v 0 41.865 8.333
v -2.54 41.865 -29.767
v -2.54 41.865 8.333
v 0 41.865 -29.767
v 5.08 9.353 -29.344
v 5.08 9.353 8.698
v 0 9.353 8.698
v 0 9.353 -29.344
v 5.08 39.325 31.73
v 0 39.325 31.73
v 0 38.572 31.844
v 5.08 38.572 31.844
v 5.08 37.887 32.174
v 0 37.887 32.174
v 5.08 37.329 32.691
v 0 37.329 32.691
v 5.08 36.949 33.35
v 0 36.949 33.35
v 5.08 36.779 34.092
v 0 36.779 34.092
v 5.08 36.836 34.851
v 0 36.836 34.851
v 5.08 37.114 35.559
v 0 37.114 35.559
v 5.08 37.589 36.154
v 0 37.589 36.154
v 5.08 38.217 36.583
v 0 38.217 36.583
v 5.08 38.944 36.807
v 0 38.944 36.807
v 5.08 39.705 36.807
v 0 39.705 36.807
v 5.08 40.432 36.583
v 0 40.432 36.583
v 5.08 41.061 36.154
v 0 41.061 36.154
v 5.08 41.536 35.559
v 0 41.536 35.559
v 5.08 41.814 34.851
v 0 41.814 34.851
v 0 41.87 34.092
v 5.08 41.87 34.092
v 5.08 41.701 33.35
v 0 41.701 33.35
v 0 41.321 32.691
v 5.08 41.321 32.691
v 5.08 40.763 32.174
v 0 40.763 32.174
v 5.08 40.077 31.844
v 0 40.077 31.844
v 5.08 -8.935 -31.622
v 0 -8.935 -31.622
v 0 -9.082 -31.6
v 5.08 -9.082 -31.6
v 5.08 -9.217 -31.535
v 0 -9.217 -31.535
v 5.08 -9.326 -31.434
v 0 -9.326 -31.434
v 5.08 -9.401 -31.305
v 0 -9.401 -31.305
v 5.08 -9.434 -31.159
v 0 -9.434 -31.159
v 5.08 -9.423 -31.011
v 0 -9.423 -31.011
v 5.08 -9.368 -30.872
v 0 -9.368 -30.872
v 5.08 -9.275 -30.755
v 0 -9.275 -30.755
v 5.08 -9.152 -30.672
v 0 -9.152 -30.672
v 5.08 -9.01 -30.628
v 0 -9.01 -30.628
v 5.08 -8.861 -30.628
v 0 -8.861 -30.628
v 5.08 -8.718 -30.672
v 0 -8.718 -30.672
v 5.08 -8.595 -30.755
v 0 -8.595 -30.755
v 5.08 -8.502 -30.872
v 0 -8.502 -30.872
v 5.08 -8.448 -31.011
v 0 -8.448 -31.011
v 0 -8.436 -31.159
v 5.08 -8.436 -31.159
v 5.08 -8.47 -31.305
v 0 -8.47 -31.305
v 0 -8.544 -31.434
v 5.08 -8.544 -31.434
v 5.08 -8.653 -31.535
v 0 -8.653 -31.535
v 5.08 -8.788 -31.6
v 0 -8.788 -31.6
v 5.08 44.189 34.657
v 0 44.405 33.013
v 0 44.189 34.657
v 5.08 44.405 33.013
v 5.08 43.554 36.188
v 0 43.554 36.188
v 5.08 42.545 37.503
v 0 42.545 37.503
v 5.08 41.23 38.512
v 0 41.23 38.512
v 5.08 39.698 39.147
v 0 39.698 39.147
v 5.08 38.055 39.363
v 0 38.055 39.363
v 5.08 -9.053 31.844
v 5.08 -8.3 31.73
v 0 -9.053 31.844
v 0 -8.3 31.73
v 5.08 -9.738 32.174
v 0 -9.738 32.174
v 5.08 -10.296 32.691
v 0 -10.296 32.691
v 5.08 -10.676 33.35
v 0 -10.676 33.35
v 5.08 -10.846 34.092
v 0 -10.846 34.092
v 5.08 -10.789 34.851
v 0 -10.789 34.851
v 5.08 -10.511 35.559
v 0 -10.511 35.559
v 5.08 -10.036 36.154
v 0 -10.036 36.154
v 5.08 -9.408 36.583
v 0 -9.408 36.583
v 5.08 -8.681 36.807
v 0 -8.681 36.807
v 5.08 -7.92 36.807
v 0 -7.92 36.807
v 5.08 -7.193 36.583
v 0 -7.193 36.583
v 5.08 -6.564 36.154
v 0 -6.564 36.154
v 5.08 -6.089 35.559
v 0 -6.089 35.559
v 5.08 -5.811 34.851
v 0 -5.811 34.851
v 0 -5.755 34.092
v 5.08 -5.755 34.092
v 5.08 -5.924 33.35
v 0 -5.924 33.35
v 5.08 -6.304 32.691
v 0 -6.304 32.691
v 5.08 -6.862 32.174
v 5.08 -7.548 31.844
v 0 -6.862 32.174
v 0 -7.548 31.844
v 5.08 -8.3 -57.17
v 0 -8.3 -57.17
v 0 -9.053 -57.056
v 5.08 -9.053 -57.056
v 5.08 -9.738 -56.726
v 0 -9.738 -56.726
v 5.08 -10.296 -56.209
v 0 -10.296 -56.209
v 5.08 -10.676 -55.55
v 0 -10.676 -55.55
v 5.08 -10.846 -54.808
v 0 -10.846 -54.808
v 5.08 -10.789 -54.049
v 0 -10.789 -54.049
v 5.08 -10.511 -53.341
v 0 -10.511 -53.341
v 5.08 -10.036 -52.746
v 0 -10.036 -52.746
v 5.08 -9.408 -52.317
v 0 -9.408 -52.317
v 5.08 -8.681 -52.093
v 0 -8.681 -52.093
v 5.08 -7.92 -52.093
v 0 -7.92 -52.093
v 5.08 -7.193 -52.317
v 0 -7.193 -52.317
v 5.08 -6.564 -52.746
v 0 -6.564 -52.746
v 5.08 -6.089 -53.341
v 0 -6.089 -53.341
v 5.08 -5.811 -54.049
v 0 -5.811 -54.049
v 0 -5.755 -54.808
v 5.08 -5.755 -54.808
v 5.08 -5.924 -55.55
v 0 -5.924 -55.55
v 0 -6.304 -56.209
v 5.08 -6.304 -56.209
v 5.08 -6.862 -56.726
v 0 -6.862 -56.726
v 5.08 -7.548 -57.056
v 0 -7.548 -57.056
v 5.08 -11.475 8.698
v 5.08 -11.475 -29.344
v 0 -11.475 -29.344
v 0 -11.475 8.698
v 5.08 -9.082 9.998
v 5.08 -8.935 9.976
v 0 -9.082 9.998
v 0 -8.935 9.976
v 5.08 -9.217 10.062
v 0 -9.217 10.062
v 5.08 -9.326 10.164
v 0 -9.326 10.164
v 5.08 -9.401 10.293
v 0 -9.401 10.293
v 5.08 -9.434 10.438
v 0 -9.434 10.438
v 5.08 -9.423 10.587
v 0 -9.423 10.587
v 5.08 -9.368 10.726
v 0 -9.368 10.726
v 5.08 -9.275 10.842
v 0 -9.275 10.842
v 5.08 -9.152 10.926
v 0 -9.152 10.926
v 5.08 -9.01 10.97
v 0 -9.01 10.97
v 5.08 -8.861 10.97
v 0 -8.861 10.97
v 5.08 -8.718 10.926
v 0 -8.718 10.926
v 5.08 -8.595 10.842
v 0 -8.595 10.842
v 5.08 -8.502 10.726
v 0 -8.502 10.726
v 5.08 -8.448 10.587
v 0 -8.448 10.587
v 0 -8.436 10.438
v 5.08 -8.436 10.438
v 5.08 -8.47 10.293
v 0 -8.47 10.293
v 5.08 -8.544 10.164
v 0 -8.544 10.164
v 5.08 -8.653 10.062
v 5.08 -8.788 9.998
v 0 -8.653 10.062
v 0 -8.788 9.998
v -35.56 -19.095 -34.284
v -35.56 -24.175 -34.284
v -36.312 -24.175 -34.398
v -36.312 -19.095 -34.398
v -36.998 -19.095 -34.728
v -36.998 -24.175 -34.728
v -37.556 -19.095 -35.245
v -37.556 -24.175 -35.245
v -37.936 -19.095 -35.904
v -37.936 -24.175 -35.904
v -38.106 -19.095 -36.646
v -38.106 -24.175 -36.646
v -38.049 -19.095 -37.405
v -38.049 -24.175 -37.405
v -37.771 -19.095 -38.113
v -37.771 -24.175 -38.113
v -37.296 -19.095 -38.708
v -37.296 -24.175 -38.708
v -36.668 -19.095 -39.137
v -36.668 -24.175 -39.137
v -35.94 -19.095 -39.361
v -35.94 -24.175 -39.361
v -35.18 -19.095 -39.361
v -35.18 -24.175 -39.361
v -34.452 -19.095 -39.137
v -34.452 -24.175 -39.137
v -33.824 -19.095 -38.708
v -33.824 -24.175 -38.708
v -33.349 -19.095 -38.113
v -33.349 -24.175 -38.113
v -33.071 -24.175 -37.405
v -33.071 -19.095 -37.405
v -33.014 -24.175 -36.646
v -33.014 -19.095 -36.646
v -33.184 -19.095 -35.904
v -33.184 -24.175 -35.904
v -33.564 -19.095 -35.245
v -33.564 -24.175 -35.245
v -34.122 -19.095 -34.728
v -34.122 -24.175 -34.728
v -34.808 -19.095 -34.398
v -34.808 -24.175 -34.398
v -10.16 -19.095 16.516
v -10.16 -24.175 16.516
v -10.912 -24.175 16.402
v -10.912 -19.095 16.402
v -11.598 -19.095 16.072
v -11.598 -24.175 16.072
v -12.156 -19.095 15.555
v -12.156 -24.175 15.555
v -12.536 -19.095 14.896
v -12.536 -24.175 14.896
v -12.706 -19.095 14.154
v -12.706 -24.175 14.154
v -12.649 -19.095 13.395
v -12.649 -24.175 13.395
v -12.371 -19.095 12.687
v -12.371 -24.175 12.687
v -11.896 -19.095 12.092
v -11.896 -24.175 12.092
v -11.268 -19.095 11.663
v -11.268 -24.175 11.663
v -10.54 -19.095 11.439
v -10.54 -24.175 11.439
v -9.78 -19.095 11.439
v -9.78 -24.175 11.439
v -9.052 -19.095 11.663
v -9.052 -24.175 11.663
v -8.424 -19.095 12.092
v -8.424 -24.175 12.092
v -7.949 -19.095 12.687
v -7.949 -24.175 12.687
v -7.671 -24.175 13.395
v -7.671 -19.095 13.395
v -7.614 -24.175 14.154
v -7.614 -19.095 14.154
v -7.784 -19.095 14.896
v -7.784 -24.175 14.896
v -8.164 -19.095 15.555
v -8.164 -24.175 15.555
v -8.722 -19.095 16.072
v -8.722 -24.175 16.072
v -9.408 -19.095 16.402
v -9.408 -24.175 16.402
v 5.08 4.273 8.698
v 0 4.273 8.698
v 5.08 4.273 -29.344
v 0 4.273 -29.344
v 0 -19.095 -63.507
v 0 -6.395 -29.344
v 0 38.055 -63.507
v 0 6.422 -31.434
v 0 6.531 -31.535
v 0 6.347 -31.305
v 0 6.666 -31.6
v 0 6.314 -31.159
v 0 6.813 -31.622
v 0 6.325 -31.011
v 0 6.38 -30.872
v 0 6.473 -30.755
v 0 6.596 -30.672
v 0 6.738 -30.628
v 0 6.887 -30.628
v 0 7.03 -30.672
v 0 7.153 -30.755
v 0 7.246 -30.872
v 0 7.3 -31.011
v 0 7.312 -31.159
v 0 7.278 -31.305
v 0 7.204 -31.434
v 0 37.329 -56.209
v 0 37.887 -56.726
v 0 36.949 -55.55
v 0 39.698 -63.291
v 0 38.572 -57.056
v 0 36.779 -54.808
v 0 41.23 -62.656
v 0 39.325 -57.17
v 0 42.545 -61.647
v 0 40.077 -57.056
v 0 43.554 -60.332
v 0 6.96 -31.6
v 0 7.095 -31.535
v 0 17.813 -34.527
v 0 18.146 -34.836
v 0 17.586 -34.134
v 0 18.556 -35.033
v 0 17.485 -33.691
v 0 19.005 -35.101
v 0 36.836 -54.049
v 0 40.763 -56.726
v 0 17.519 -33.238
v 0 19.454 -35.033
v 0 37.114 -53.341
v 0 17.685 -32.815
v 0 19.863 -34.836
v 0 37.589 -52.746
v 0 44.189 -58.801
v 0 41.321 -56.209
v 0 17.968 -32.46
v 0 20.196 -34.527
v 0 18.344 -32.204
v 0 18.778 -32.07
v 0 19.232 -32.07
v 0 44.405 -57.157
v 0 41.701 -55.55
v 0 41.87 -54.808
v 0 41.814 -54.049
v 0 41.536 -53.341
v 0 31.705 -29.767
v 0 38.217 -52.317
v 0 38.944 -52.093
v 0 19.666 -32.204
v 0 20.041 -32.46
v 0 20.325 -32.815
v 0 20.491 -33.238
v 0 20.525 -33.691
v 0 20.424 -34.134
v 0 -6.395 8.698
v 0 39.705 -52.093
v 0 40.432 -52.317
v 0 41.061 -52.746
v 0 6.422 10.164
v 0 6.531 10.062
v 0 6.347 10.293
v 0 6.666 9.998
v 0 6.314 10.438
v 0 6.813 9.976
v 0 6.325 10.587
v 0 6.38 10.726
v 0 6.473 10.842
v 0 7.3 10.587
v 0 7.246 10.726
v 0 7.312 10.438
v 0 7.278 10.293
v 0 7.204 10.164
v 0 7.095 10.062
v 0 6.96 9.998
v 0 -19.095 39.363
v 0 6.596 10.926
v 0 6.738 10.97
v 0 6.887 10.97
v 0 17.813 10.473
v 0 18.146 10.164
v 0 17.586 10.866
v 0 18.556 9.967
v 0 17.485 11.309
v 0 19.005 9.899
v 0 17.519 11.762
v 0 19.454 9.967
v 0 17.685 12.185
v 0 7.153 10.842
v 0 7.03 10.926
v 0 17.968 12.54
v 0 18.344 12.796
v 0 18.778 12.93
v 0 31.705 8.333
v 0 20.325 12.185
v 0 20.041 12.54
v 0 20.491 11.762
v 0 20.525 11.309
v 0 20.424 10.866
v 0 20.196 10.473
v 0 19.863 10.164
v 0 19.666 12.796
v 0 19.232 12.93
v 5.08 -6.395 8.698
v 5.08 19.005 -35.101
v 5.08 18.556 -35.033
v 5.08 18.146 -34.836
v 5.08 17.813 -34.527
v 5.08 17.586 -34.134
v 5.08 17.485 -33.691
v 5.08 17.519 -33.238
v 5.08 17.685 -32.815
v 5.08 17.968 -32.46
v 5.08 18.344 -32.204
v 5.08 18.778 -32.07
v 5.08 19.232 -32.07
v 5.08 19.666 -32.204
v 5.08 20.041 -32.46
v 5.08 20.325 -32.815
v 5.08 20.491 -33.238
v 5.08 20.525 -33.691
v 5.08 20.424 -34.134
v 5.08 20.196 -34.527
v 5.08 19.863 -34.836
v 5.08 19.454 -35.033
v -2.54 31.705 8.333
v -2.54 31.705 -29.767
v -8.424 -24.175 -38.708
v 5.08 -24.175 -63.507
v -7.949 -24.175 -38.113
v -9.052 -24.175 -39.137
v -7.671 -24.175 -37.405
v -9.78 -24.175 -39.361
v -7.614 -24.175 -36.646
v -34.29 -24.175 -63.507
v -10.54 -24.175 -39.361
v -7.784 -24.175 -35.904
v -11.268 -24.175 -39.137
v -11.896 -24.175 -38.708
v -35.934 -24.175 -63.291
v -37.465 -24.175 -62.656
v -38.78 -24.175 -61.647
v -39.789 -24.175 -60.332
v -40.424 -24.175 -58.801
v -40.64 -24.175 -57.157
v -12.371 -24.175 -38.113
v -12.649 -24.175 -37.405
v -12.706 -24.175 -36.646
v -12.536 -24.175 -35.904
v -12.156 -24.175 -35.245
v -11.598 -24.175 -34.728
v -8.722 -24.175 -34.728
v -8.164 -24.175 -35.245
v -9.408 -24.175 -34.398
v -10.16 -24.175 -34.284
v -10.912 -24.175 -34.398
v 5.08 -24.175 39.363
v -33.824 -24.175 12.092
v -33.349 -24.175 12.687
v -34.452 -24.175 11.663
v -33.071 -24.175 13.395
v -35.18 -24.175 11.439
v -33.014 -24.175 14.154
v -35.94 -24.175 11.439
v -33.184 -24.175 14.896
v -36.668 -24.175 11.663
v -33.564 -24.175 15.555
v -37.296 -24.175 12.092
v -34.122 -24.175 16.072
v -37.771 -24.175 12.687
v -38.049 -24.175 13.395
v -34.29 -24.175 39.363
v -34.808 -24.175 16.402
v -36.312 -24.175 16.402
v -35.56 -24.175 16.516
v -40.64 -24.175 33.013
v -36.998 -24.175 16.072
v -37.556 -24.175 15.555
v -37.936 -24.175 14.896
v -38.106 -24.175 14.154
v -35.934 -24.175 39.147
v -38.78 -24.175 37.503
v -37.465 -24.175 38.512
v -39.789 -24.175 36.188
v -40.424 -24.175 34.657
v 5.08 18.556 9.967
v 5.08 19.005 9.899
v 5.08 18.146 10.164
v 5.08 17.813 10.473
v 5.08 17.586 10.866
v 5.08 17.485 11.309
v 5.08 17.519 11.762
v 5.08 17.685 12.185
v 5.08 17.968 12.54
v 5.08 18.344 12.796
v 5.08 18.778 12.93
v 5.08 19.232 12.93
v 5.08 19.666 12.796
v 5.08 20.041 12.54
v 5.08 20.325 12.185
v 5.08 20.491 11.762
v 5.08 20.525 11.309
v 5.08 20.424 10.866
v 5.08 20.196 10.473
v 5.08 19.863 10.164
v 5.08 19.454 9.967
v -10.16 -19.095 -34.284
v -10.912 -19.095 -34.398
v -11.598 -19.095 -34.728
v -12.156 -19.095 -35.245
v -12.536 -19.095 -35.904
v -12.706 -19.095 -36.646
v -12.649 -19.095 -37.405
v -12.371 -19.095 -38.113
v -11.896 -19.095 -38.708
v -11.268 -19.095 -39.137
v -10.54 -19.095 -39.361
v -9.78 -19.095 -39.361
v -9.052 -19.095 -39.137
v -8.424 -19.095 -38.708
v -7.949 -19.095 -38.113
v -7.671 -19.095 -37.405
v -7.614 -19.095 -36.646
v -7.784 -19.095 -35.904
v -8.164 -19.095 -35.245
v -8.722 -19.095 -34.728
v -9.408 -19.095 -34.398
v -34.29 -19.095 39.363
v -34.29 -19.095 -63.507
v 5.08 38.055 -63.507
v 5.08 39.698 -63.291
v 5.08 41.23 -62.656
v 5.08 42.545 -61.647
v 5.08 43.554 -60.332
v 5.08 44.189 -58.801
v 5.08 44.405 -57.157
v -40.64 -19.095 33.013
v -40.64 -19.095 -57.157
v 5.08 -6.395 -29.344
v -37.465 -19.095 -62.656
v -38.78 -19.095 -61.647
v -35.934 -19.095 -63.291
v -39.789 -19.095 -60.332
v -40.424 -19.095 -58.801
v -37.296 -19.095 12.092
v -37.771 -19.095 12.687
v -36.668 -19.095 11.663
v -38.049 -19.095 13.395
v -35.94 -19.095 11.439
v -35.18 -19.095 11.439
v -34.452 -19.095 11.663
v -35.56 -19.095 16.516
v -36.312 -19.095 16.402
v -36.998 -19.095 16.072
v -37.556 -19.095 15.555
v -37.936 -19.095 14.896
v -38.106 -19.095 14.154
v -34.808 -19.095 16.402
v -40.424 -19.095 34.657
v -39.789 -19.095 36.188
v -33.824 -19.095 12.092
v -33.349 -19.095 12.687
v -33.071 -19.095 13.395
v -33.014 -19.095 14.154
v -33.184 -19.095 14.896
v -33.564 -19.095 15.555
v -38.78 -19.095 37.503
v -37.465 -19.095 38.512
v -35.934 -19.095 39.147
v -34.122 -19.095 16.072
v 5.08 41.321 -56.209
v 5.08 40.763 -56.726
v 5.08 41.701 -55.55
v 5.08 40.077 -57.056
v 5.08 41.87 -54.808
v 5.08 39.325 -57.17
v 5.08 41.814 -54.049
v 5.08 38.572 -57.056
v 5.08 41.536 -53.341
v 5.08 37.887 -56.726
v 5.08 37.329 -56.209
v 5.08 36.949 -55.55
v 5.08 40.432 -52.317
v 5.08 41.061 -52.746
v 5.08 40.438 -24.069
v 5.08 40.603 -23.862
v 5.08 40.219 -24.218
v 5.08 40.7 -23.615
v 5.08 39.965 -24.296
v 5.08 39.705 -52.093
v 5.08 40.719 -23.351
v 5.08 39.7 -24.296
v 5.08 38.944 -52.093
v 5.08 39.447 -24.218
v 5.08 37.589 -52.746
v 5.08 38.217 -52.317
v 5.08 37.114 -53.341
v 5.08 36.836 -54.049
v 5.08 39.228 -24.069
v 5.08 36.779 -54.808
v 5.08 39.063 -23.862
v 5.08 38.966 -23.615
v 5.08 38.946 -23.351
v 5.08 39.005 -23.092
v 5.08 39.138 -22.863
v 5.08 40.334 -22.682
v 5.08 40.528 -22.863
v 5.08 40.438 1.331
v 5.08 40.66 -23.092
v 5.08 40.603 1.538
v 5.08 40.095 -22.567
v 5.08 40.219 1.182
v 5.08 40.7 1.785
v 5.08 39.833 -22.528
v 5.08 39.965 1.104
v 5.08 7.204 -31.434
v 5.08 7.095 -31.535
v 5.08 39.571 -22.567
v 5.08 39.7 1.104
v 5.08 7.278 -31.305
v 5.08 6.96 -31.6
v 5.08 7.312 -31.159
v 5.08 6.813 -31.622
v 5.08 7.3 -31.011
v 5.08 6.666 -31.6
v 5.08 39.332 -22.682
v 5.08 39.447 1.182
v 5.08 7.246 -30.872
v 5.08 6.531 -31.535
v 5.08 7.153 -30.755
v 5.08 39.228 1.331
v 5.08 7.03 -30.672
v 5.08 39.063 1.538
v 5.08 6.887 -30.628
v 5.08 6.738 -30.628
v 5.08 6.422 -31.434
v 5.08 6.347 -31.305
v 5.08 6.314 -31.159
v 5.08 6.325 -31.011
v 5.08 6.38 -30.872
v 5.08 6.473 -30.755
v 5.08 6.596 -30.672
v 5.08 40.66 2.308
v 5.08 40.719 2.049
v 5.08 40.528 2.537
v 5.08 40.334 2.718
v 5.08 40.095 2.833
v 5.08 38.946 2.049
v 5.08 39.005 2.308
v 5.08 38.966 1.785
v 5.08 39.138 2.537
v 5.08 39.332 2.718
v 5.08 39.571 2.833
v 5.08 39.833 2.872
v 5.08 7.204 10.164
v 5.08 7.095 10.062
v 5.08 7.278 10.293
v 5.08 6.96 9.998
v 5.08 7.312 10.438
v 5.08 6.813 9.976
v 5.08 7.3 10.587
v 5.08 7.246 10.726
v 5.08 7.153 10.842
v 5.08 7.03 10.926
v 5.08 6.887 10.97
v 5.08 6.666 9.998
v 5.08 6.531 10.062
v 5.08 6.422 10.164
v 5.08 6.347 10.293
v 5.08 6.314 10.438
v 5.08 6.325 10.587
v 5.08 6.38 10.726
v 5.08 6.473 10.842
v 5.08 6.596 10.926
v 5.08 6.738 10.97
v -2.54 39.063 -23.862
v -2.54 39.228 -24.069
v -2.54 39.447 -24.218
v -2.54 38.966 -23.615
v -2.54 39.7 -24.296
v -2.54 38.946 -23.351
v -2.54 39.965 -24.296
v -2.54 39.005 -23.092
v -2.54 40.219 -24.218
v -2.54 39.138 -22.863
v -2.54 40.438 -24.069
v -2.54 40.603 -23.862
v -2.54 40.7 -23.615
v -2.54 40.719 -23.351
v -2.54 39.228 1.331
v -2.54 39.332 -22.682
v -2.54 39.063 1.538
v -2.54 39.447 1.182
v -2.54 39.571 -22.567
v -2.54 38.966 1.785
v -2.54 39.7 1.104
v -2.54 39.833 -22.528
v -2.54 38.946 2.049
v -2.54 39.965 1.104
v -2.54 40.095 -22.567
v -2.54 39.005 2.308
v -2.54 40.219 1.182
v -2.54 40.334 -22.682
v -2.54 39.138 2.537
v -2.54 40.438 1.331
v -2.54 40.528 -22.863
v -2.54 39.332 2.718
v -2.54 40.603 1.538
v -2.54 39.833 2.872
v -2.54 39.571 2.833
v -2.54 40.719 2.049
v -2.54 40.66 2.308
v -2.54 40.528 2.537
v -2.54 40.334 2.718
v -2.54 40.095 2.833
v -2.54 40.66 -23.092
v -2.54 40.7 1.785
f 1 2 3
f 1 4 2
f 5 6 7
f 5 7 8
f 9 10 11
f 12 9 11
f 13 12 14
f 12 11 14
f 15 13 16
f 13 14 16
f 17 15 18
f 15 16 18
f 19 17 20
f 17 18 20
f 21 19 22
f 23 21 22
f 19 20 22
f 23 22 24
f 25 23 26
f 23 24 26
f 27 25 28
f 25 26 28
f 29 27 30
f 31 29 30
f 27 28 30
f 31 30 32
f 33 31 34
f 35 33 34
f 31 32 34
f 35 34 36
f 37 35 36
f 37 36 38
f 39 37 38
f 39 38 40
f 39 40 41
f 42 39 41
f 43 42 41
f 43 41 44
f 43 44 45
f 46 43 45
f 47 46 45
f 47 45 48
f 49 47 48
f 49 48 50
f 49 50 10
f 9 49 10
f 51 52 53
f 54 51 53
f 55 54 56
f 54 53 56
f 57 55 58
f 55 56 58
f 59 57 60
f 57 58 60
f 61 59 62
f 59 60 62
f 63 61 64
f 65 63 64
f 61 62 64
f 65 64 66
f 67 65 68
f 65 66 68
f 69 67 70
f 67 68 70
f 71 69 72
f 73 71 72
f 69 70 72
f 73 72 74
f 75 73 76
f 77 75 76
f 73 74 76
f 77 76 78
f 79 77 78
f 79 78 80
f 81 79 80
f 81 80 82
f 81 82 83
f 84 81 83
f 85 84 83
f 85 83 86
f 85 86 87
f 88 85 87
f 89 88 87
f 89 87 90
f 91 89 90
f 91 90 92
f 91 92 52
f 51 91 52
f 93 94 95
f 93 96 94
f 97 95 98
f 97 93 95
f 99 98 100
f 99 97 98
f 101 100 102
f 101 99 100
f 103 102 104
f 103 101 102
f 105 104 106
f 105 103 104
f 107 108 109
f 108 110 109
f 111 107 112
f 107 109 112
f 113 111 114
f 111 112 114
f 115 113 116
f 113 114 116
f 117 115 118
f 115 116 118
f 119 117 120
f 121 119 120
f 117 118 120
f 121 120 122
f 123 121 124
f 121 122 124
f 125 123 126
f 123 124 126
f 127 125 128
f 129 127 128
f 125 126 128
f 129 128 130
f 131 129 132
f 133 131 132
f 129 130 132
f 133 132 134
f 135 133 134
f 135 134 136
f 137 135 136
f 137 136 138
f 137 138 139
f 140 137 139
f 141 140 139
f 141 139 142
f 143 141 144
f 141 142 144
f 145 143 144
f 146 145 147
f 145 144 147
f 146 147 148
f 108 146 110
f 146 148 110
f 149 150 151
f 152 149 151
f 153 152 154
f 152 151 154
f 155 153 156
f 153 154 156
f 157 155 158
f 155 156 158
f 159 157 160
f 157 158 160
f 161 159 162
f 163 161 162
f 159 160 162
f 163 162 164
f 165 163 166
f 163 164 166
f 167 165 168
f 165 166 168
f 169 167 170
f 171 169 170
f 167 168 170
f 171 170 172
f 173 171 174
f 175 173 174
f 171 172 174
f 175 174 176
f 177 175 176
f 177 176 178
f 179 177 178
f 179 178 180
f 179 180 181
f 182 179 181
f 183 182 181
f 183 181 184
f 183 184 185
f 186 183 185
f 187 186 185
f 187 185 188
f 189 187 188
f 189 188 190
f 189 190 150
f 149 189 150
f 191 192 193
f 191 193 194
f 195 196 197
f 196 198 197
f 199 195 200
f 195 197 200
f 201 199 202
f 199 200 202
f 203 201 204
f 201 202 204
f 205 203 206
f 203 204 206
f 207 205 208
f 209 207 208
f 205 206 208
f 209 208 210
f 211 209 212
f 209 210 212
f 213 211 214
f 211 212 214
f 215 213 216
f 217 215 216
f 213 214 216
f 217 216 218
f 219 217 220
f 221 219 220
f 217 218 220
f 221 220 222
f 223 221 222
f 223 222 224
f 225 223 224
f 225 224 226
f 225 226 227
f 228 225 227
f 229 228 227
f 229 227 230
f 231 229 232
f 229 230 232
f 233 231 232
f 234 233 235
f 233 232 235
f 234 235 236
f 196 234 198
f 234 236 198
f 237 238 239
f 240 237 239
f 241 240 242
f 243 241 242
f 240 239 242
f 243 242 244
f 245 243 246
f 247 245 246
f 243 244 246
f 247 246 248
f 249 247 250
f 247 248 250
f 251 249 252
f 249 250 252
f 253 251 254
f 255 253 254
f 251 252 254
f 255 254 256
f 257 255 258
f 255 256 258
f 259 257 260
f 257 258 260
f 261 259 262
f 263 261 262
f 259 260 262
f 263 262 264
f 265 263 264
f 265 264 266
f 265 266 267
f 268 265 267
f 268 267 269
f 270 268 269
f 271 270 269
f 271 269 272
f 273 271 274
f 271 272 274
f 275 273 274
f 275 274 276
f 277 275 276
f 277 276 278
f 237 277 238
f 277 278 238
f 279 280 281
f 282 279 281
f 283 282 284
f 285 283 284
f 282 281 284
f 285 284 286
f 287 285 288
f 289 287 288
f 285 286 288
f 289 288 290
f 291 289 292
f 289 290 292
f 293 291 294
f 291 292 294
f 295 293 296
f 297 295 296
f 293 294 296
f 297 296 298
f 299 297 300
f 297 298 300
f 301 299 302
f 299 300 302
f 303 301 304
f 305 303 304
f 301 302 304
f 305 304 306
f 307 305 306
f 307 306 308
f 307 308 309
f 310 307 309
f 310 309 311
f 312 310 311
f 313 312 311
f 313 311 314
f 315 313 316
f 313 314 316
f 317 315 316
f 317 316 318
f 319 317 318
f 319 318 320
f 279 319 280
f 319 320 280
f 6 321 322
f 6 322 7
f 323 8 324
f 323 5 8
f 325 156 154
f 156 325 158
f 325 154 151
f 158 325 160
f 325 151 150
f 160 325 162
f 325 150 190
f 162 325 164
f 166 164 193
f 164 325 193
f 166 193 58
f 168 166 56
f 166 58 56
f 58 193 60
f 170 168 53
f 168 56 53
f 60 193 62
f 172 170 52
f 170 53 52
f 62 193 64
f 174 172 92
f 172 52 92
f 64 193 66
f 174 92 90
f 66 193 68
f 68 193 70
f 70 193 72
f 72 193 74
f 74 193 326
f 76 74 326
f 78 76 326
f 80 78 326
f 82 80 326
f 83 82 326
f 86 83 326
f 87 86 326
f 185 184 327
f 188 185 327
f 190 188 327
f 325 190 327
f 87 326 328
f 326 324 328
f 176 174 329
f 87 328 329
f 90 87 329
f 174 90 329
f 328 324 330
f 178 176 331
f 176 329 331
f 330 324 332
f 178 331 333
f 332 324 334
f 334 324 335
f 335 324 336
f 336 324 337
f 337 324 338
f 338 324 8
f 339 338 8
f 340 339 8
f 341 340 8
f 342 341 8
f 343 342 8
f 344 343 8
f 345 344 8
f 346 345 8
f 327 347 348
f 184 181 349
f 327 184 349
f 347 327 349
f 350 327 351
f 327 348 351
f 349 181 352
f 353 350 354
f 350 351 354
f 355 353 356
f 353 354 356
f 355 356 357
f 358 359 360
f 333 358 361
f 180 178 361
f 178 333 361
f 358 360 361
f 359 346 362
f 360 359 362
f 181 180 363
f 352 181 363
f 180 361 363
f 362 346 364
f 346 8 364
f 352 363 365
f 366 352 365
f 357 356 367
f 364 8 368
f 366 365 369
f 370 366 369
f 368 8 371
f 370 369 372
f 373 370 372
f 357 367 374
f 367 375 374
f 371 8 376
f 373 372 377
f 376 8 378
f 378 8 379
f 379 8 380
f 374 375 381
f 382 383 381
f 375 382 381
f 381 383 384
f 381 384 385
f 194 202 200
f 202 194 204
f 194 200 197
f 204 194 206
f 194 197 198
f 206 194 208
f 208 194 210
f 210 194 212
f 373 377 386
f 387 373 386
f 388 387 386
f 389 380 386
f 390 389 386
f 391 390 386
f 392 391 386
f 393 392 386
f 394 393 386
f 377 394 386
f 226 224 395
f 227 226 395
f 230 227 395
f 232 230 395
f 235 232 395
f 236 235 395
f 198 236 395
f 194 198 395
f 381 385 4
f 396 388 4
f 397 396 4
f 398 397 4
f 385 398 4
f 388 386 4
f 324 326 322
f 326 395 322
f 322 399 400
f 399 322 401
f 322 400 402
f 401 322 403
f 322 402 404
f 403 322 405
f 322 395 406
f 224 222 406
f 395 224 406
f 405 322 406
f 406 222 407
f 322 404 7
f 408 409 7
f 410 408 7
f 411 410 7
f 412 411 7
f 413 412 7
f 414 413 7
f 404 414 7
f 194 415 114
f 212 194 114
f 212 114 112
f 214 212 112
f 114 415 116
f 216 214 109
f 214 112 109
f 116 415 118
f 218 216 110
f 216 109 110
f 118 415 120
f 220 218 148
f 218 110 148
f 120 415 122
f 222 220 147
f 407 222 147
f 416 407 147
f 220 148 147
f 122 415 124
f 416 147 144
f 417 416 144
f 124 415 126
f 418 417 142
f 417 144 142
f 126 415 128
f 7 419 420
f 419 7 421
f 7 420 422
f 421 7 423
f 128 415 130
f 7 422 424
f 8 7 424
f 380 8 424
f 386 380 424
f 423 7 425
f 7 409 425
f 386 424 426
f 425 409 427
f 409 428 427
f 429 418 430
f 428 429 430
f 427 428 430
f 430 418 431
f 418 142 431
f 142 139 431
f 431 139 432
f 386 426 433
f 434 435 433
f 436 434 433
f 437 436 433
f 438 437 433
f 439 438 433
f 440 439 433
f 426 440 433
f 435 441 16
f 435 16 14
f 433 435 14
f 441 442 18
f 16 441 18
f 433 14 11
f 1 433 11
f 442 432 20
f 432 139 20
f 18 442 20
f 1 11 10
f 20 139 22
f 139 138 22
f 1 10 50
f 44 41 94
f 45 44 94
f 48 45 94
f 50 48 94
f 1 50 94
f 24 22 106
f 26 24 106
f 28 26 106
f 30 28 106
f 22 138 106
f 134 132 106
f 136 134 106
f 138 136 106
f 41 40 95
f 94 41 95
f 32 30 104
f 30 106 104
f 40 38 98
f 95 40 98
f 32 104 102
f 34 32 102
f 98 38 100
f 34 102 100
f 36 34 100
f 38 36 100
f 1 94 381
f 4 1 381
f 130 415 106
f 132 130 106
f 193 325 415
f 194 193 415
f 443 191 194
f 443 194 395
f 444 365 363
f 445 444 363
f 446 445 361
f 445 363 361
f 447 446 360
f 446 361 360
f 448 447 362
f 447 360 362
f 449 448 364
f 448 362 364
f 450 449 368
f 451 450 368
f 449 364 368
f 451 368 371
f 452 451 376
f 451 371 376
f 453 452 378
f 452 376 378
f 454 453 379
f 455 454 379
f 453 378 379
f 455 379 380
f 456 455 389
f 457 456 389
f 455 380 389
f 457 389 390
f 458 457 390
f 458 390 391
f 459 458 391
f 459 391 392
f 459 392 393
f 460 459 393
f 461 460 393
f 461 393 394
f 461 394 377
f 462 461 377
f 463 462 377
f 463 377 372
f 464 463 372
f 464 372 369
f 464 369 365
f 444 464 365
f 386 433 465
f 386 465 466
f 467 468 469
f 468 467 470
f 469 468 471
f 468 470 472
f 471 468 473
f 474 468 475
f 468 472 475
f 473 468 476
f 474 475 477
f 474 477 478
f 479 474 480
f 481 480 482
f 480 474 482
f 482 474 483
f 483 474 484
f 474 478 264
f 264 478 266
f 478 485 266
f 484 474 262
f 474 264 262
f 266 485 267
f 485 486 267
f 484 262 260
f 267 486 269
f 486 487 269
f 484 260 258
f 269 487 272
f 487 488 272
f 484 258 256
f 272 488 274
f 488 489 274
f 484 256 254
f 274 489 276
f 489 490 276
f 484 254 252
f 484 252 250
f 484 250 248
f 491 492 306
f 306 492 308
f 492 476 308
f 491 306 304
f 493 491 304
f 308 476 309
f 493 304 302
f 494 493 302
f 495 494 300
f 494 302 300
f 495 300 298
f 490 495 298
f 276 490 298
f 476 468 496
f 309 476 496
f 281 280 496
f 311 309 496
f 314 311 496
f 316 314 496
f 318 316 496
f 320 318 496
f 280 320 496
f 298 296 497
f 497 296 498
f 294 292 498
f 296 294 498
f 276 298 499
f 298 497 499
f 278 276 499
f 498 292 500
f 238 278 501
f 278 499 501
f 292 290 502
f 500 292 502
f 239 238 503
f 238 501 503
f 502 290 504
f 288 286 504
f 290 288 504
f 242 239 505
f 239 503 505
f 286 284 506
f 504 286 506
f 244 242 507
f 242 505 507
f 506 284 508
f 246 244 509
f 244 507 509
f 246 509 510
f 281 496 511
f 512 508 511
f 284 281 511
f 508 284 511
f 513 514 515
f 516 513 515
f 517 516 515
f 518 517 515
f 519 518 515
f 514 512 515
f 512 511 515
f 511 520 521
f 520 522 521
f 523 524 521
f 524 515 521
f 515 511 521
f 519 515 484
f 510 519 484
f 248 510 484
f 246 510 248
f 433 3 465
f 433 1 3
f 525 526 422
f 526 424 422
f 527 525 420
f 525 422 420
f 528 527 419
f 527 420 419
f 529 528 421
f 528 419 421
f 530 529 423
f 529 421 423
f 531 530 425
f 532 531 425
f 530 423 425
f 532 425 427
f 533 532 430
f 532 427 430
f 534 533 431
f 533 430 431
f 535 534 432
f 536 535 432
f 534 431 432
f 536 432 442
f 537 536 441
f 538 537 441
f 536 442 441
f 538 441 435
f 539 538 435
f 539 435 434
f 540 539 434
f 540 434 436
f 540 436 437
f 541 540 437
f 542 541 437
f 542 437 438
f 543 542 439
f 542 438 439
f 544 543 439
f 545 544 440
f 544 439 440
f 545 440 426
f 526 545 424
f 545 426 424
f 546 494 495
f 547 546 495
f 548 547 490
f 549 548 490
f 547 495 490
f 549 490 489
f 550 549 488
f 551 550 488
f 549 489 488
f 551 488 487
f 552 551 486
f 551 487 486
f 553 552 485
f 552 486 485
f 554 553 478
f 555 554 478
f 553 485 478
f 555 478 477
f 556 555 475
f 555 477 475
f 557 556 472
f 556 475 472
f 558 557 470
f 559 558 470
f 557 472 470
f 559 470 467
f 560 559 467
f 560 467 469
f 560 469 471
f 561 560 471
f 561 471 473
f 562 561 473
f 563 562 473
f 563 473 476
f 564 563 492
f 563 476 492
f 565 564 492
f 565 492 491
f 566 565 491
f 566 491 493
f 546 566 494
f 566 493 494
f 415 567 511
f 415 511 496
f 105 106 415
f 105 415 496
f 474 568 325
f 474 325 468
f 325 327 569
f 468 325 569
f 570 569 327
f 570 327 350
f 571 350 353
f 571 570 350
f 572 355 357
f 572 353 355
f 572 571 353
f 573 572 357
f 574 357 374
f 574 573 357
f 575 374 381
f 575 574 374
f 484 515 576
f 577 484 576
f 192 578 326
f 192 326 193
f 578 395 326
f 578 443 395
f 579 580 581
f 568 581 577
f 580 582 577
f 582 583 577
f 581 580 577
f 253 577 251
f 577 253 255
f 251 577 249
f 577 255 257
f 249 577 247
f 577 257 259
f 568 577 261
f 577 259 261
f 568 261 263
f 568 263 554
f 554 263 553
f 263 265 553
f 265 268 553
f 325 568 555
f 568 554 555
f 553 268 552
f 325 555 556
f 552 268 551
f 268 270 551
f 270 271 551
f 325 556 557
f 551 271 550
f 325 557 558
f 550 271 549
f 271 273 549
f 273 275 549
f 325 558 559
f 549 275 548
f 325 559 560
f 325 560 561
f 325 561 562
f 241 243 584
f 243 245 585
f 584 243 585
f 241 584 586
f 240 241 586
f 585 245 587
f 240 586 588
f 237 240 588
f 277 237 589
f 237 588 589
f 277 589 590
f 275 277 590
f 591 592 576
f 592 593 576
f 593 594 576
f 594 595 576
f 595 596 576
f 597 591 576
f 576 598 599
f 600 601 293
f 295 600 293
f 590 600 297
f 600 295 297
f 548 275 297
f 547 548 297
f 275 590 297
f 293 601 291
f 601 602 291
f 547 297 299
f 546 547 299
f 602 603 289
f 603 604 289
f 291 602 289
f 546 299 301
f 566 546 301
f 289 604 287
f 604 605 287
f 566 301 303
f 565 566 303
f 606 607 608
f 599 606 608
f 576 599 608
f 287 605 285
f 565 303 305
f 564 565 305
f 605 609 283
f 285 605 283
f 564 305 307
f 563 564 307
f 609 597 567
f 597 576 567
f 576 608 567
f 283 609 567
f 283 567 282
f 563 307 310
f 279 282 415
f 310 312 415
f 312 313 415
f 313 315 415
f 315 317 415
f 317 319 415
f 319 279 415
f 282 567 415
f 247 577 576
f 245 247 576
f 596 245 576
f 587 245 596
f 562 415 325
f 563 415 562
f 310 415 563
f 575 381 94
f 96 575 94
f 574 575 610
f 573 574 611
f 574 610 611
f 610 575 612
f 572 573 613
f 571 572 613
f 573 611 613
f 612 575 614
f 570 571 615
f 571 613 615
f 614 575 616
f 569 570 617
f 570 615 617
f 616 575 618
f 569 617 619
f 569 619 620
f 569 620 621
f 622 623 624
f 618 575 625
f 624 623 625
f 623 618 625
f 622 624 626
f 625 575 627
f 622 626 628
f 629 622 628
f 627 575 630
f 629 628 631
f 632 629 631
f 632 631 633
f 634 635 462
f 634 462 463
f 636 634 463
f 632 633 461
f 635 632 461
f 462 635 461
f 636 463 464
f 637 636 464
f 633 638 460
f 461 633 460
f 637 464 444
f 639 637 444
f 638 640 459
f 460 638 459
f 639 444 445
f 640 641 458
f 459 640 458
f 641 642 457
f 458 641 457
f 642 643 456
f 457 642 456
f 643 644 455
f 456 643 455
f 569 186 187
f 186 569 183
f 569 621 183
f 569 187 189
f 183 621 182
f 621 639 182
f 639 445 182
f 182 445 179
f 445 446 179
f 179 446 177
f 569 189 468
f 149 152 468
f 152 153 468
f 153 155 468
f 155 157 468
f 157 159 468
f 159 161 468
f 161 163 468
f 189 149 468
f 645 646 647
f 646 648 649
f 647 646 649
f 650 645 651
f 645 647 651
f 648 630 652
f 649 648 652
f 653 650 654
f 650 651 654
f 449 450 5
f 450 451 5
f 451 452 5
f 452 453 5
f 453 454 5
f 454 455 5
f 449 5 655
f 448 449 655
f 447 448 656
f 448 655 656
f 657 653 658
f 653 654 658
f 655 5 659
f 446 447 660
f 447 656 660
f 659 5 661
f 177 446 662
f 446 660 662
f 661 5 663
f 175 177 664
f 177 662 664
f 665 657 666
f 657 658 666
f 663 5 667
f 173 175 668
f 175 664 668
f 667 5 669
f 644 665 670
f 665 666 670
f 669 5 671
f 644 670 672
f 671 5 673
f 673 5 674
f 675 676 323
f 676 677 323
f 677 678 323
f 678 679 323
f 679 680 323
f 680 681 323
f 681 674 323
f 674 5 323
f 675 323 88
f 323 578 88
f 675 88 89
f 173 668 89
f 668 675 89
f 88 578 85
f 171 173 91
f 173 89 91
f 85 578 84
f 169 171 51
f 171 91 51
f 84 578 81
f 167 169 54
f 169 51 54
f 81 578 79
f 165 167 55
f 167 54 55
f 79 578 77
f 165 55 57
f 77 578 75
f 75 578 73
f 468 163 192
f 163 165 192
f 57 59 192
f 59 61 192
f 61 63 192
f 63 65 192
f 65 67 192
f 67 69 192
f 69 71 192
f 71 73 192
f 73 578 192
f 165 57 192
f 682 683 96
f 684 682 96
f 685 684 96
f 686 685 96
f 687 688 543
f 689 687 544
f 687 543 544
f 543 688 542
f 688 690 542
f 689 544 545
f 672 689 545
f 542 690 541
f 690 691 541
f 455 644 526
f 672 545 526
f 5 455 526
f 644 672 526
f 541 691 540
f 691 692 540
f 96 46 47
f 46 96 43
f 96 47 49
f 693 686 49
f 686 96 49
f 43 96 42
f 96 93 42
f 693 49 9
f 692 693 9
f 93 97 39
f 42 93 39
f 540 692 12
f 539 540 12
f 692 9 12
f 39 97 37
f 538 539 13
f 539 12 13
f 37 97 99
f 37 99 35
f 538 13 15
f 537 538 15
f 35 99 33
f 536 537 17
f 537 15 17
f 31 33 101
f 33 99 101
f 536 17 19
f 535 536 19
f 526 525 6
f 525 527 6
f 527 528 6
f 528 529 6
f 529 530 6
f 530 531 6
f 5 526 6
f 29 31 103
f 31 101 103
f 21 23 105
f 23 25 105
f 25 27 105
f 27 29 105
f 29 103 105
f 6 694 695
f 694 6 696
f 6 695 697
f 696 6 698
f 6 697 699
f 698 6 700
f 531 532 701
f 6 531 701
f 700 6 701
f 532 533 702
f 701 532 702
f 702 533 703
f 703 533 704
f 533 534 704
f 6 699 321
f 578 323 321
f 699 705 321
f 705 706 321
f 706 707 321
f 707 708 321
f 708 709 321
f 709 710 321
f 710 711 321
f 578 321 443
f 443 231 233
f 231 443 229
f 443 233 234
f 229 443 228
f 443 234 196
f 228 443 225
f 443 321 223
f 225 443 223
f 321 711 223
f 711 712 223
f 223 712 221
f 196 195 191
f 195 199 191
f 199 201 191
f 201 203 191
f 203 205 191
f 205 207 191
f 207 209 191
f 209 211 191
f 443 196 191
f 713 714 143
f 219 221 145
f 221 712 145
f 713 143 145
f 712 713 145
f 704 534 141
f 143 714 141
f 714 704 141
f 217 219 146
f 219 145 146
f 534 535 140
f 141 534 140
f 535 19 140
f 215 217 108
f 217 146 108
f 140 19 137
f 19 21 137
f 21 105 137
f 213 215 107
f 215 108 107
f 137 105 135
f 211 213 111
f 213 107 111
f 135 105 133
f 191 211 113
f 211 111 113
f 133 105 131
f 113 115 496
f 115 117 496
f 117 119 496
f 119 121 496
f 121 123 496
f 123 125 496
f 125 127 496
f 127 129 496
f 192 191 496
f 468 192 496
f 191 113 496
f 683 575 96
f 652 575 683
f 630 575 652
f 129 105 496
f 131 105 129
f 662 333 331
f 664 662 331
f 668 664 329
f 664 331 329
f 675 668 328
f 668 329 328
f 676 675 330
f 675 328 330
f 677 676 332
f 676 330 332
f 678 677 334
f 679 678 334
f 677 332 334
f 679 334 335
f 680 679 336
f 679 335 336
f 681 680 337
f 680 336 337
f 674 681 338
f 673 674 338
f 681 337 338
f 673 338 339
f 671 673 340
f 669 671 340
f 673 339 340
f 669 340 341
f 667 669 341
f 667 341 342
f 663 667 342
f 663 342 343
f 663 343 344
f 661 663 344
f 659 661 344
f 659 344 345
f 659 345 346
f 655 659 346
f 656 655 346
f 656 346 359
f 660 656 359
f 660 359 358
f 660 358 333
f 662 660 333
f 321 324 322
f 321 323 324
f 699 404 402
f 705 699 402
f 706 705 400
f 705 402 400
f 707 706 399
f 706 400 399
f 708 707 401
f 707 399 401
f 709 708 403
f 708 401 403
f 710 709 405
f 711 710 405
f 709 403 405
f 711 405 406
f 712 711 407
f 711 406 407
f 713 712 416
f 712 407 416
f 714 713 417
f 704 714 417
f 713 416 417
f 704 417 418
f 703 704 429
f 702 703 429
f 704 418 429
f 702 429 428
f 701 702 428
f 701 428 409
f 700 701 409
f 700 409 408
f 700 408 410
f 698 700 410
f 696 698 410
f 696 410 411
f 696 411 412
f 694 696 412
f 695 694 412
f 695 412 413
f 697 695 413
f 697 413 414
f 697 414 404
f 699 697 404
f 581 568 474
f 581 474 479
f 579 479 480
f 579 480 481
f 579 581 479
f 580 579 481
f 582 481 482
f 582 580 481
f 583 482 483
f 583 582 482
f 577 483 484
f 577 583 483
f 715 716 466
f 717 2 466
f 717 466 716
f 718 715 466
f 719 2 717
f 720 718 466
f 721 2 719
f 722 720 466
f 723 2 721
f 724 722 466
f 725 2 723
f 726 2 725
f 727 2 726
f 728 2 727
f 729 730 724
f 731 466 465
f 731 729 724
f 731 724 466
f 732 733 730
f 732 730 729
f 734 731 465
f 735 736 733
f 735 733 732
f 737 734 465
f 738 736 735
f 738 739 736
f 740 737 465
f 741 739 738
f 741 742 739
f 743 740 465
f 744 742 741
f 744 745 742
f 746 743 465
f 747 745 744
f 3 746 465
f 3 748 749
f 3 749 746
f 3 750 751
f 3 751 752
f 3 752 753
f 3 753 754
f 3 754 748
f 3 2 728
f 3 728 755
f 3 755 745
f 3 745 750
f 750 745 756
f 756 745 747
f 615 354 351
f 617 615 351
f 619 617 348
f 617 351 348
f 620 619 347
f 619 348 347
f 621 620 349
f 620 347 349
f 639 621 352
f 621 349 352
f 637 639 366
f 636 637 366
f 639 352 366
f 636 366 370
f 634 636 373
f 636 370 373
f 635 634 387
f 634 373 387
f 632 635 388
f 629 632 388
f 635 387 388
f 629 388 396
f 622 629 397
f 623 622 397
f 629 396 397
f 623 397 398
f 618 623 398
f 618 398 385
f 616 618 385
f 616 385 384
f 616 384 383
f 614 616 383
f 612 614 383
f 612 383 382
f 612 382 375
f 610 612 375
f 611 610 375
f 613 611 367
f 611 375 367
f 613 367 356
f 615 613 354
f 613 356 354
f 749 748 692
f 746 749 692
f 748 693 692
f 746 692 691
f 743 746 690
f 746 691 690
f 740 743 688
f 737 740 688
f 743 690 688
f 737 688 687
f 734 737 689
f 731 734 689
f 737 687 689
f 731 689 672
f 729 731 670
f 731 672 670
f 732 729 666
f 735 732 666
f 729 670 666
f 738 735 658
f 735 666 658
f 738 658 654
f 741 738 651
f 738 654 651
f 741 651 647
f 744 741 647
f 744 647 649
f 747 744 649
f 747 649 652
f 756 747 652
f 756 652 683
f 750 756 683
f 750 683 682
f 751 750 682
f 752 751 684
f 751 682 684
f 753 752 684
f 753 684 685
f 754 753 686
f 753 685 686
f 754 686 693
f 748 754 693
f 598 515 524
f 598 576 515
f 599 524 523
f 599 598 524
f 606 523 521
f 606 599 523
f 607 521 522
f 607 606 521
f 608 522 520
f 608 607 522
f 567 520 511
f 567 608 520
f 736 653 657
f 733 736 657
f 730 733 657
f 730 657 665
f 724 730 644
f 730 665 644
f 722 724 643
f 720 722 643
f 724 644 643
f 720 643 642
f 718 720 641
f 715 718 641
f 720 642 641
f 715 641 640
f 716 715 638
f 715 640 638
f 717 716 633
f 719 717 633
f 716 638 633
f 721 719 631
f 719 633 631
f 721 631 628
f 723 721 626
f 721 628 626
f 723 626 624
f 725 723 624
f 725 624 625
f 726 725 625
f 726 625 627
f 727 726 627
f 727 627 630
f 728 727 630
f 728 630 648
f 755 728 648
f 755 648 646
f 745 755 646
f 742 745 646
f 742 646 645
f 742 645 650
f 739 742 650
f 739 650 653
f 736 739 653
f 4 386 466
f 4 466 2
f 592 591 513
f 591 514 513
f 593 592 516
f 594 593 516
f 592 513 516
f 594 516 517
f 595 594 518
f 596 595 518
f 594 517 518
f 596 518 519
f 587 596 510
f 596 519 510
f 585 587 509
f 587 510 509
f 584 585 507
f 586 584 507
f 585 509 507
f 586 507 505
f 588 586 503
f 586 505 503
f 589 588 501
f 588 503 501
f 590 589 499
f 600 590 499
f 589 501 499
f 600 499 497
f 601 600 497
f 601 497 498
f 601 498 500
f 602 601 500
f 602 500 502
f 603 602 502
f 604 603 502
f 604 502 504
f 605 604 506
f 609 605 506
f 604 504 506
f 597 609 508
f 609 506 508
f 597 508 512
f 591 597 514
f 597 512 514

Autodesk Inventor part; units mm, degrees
ref_plane "YZ Plane" through (0, 0, 0) normal (1, 0, 0) x (0, 1, 0)
ref_plane "XZ Plane" through (0, 0, 0) normal (0, 1, 0) x (-1, 0, 0)
ref_plane "XY Plane" through (0, 0, 0) normal (0, 0, 1) x (1, 0, 0)
sketch "Sketch1" plane through (0, 0, 0) normal (1, 0, 0) x (0, 1, 0)
  line L0 (44.4049, 39.363) -> (-19.0951, 39.363)
  line L1 (-19.0951, 39.363) -> (-19.0951, -63.507)
  line L2 (-19.0951, -63.507) -> (44.4049, -63.507)
  line L3 (44.4049, -63.507) -> (44.4049, 39.363)
  point P0 (0, 0)
  dimension "d0" = 102.87
  dimension "d1" = 63.5
extrude "Extrusion1" add sketch "Sketch1" along normal blind 5.08
sketch "Sketch2" plane through (5.08, 0, 0) normal (1, 0, 0) x (0, 0, -1)
  line L0 (63.507, 44.4049) -> (-39.363, 44.4049) projected
  line L1 (-39.363, 44.4049) -> (-39.363, -19.0951) projected
  point P0 (0, 0)
  point P1 (-34.283, 39.3249)
  point P2 (54.617, 39.3249)
  point P3 (54.617, -8.3001)
  point P4 (-34.283, -8.3001)
  dimension "d4" = 0
  dimension "d5" = 0
  dimension "d6" = 0
  dimension "d7" = 0
  dimension "d8" = 88.9
  dimension "d9" = 5.08
  dimension "d10" = 5.08
  dimension "d11" = 47.625
hole "Hole1" at (5.08, 39.3249, 34.283) at (5.08, 39.3249, -54.617) at (5.08, -8.3001, -54.617) at (5.08, -8.3001, 34.283) direction (-1, 0, 0) diameter 5.1054 end through all clearance for "Flat Head Machine Screw (82)" size "#10" standard "Ansi Unified Screw Threads"
fillet "Fillet1" radius 6.35 2 edges at (2.54, 44.4049, 39.363) (2.54, 44.4049, -63.507)
sketch "Sketch7" plane through (0, -19.0951, 39.363) normal (0, 0, 1) x (1, 0, 0)
  line L0 (0, 0) -> (5.08, 0)
  line L1 (5.08, 0) -> (5.08, -5.08)
  line L2 (5.08, -5.08) -> (-40.64, -5.08)
  line L3 (-40.64, -5.08) -> (-40.64, 0)
  line L4 (-40.64, 0) -> (0, 0)
  line L5 (0, 0) -> (0, 0)
  line L6 (0, 0) -> (5.08, 0) projected
  line L7 (0, 57.15) -> (0, 0) projected
  point P0 (0, 19.0951)
  dimension "d51" = 5.08
  dimension "d52" = 5.08
  dimension "d53" = 90
  dimension "d54" = 5.08
  dimension "d55" = 45.72
  dimension "d56" = 0
  dimension "d57" = 0
extrude "Extrusion4" add sketch "Sketch7" against normal blind 102.87
sketch "Sketch8" plane through (0, -19.0951, 39.363) normal (0, 1, 0) x (1, 0, 0)
  line L0 (0, 0) -> (0, 102.87) projected
  line L1 (-40.64, 0) -> (0, 0) projected
  line L2 (-40.64, 102.87) -> (0, 102.87) projected
  line L3 (-40.64, 0) -> (-40.64, 102.87) projected
  point P0 (0, 39.363)
  point P1 (-10.16, 25.4)
  point P2 (-35.56, 25.4)
  point P3 (-35.56, 76.2)
  point P4 (-10.16, 76.2)
  dimension "d67" = 0
  dimension "d69" = 0
  dimension "d71" = 0
  dimension "d72" = 0
  dimension "d143" = 5.08
  dimension "d144" = 26.67
  dimension "d145" = 50.8
  dimension "d146" = 25.4
hole "Hole3" at (-10.16, -19.0951, 13.963) at (-35.56, -19.0951, 13.963) at (-35.56, -19.0951, -36.837) at (-10.16, -19.0951, -36.837) direction (0, -1, 0) diameter 5.1054 end through all clearance for "Flat Head Machine Screw (82)" size "#10" standard "Ansi Unified Screw Threads"
fillet "Fillet2" radius 6.35 2 edges at (-40.64, -21.6351, -63.507) (-40.64, -21.6351, 39.363)
sketch "Sketch9" plane through (5.08, 0, 0) normal (1, 0, 0) x (0, 0, -1)
  line L0 (57.157, 44.4049) -> (-33.013, 44.4049) projected
  line L1 (-39.363, 38.0549) -> (-39.363, -24.1751) projected
  line L2 (63.507, 38.0549) -> (63.507, -24.1751) projected
  point P0 (0, 0)
  point P1 (-11.423, 19.0049)
  point P2 (33.577, 19.0049)
  dimension "d82" = 0
  dimension "d83" = 45
  dimension "d84" = 25.4
  dimension "d85" = 27.94
  dimension "d86" = 29.93
hole "Hole4" at (5.08, 19.0049, 11.423) at (5.08, 19.0049, -33.577) direction (-1, 0, 0) diameter 3.048 end through all
sketch "Sketch10" plane through (0, 0, 0) normal (-1, 0, 0) x (0, 0, 1)
  line L0 (-29.767, 41.8649) -> (8.333, 41.8649)
  line L1 (8.333, 41.8649) -> (8.333, 31.7049)
  line L2 (8.333, 31.7049) -> (-29.767, 31.7049)
  line L3 (-29.767, 31.7049) -> (-29.767, 41.8649)
  line L4 (-57.157, 44.4049) -> (33.013, 44.4049) projected
  circle A0 centre (-33.577, 19.0049) radius 1.524 projected
  circle A1 centre (11.423, 19.0049) radius 1.524 projected
  point P0 (0, 0)
  dimension "d94" = 10.16
  dimension "d95" = 38.1
  dimension "d96" = 2.54
  dimension "d97" = 3.81
  dimension "d98" = 3.09
extrude "Extrusion5" add sketch "Sketch10" along normal blind 2.54 contours L0 L1 L2 L3
sketch "Sketch11" plane through (-2.54, 0, 0) normal (-1, 0, 0) x (0, 0, 1)
  line L0 (-29.767, 31.7049) -> (8.333, 31.7049) projected
  line L1 (-29.767, 41.8649) -> (-29.767, 31.7049) projected
  line L2 (8.333, 41.8649) -> (-29.767, 41.8649) projected
  line L3 (8.333, 31.7049) -> (8.333, 41.8649) projected
  point P0 (0, 0)
  point P1 (-23.417, 39.8329)
  point P2 (1.983, 39.8329)
  dimension "d101" = 0
  dimension "d102" = 25.4
  dimension "d103" = 6.35
  dimension "d104" = 8.128
hole "Hole5" at (-2.54, 39.8329, -23.417) at (-2.54, 39.8329, 1.983) direction (1, 0, 0) diameter 1.778 end through all
sketch "Sketch12" plane through (5.08, 0, 0) normal (1, 0, 0) x (0, 0, -1)
  line L0 (-39.363, -24.1751) -> (63.507, -24.1751) projected
  line L1 (63.507, 38.0549) -> (63.507, -24.1751) projected
  point P0 (0, 0)
  point P1 (31.122, 6.8129)
  point P2 (-10.4756, 6.8129)
  point P3 (-10.4756, -8.9351)
  point P4 (31.122, -8.9351)
  dimension "d112" = 41.5976
  dimension "d113" = 0
  dimension "d114" = 0
  dimension "d115" = 15.748
  dimension "d116" = 0
  dimension "d117" = 0
  dimension "d118" = 15.24
  dimension "d119" = 32.385
hole "Hole6" at (5.08, 6.8129, -31.122) at (5.08, 6.8129, 10.4756) at (5.08, -8.9351, 10.4756) at (5.08, -8.9351, -31.122) direction (-1, 0, 0) diameter 1 end through all
sketch "Sketch14" plane through (5.08, 0, 0) normal (1, 0, 0) x (0, 0, -1)
  line L0 (-8.6976, 9.3529) -> (29.344, 9.3529)
  line L1 (29.344, 9.3529) -> (29.344, 4.2729)
  line L2 (29.344, 4.2729) -> (-8.6976, 4.2729)
  line L3 (-8.6976, 4.2729) -> (-8.6976, 9.3529)
  line L4 (-8.6976, -6.3951) -> (29.344, -6.3951)
  line L5 (29.344, -6.3951) -> (29.344, -11.4751)
  line L6 (29.344, -11.4751) -> (-8.6976, -11.4751)
  line L7 (-8.6976, -11.4751) -> (-8.6976, -6.3951)
  circle A0 centre (31.122, -8.9351) radius 0.5 projected
  circle A1 centre (31.122, 6.8129) radius 0.5 projected
  circle A2 centre (-10.4756, 6.8129) radius 0.5 projected
  circle A3 centre (-10.4756, -8.9351) radius 0.5 projected
  point P0 (0, 0)
  dimension "d133" = 2.54
  dimension "d134" = 2.54
  dimension "d135" = 1.778
  dimension "d136" = 1.778
  dimension "d137" = 0
  dimension "d138" = 0
  dimension "d139" = 2.54
  dimension "d140" = 2.54
extrude "Extrusion7" cut sketch "Sketch14" against normal blind 20.725 contours L0 L1 L2 L3 | L4 L5 L6 L7
properties part number "Realsense100"
